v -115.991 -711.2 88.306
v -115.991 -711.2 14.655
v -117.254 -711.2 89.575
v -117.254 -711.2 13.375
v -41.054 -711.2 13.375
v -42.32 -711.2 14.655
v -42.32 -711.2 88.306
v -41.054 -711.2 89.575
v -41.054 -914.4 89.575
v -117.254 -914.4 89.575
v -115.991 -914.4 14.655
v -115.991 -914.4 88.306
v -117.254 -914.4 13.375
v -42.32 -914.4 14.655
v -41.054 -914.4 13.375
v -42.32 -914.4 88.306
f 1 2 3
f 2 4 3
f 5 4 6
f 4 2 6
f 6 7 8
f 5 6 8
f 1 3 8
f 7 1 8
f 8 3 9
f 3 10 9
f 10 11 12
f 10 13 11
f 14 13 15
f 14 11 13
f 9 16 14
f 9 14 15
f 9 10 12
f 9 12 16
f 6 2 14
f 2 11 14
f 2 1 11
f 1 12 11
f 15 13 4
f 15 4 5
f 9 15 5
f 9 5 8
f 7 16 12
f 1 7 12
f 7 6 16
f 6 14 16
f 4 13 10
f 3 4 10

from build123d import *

# Parameters (mm, degrees)
F0_W     = 76.2
F0_H     = 76.2
F1_DEPTH = 609.6
F3_DEPTH = 914.4
F4_DEPTH = 304.8
F5_DEPTH = 508
F6_DEPTH = 381
F7_DEPTH = 177.8


with BuildPart() as f1:
    # F0 (on Front) → F1 (new body)
    with BuildSketch(Plane.XZ):
        with Locations((-79.1539917648, 51.4746750653)):
            Rectangle(F0_W, F0_H)
    extrude(amount=F1_DEPTH)

    # F2 (on face) → F3 (cut)
    with BuildSketch(Plane.XZ.offset(609.6)):
        Polygon((-42.3204526305, 88.3055701852), (-98.6881405115, 88.3055701852), (-115.9909814596, 88.3055701852), (-115.9909814596, 14.655277133), (-42.3204526305, 14.655277133), align=None)
    extrude(amount=-F3_DEPTH, mode=Mode.SUBTRACT)

    # F4 (add): a face of the model
    f4_faces = [f1.faces().sort_by_distance(p)[0] for p in [
        (-42.1316224993, -609.6, 51.4746750653),
    ]]
    extrude(f4_faces, amount=F4_DEPTH)

    # F5 (cut): a face of the model
    f5_faces = [f1.faces().sort_by_distance(p)[0] for p in [
        (-42.1316224993, 0, 51.4746750653),
    ]]
    extrude(f5_faces, amount=-F5_DEPTH, mode=Mode.SUBTRACT)

    # F6 (cut): a face of the model
    f6_faces = [f1.faces().sort_by_distance(p)[0] for p in [
        (-42.1316224993, -508, 51.4746750653),
    ]]
    extrude(f6_faces, amount=-F6_DEPTH, mode=Mode.SUBTRACT)

    # F7 (add): a face of the model
    f7_faces = [f1.faces().sort_by_distance(p)[0] for p in [
        (-42.1316224993, -889, 51.4746750653),
    ]]
    extrude(f7_faces, amount=F7_DEPTH)


solid = f1.part
